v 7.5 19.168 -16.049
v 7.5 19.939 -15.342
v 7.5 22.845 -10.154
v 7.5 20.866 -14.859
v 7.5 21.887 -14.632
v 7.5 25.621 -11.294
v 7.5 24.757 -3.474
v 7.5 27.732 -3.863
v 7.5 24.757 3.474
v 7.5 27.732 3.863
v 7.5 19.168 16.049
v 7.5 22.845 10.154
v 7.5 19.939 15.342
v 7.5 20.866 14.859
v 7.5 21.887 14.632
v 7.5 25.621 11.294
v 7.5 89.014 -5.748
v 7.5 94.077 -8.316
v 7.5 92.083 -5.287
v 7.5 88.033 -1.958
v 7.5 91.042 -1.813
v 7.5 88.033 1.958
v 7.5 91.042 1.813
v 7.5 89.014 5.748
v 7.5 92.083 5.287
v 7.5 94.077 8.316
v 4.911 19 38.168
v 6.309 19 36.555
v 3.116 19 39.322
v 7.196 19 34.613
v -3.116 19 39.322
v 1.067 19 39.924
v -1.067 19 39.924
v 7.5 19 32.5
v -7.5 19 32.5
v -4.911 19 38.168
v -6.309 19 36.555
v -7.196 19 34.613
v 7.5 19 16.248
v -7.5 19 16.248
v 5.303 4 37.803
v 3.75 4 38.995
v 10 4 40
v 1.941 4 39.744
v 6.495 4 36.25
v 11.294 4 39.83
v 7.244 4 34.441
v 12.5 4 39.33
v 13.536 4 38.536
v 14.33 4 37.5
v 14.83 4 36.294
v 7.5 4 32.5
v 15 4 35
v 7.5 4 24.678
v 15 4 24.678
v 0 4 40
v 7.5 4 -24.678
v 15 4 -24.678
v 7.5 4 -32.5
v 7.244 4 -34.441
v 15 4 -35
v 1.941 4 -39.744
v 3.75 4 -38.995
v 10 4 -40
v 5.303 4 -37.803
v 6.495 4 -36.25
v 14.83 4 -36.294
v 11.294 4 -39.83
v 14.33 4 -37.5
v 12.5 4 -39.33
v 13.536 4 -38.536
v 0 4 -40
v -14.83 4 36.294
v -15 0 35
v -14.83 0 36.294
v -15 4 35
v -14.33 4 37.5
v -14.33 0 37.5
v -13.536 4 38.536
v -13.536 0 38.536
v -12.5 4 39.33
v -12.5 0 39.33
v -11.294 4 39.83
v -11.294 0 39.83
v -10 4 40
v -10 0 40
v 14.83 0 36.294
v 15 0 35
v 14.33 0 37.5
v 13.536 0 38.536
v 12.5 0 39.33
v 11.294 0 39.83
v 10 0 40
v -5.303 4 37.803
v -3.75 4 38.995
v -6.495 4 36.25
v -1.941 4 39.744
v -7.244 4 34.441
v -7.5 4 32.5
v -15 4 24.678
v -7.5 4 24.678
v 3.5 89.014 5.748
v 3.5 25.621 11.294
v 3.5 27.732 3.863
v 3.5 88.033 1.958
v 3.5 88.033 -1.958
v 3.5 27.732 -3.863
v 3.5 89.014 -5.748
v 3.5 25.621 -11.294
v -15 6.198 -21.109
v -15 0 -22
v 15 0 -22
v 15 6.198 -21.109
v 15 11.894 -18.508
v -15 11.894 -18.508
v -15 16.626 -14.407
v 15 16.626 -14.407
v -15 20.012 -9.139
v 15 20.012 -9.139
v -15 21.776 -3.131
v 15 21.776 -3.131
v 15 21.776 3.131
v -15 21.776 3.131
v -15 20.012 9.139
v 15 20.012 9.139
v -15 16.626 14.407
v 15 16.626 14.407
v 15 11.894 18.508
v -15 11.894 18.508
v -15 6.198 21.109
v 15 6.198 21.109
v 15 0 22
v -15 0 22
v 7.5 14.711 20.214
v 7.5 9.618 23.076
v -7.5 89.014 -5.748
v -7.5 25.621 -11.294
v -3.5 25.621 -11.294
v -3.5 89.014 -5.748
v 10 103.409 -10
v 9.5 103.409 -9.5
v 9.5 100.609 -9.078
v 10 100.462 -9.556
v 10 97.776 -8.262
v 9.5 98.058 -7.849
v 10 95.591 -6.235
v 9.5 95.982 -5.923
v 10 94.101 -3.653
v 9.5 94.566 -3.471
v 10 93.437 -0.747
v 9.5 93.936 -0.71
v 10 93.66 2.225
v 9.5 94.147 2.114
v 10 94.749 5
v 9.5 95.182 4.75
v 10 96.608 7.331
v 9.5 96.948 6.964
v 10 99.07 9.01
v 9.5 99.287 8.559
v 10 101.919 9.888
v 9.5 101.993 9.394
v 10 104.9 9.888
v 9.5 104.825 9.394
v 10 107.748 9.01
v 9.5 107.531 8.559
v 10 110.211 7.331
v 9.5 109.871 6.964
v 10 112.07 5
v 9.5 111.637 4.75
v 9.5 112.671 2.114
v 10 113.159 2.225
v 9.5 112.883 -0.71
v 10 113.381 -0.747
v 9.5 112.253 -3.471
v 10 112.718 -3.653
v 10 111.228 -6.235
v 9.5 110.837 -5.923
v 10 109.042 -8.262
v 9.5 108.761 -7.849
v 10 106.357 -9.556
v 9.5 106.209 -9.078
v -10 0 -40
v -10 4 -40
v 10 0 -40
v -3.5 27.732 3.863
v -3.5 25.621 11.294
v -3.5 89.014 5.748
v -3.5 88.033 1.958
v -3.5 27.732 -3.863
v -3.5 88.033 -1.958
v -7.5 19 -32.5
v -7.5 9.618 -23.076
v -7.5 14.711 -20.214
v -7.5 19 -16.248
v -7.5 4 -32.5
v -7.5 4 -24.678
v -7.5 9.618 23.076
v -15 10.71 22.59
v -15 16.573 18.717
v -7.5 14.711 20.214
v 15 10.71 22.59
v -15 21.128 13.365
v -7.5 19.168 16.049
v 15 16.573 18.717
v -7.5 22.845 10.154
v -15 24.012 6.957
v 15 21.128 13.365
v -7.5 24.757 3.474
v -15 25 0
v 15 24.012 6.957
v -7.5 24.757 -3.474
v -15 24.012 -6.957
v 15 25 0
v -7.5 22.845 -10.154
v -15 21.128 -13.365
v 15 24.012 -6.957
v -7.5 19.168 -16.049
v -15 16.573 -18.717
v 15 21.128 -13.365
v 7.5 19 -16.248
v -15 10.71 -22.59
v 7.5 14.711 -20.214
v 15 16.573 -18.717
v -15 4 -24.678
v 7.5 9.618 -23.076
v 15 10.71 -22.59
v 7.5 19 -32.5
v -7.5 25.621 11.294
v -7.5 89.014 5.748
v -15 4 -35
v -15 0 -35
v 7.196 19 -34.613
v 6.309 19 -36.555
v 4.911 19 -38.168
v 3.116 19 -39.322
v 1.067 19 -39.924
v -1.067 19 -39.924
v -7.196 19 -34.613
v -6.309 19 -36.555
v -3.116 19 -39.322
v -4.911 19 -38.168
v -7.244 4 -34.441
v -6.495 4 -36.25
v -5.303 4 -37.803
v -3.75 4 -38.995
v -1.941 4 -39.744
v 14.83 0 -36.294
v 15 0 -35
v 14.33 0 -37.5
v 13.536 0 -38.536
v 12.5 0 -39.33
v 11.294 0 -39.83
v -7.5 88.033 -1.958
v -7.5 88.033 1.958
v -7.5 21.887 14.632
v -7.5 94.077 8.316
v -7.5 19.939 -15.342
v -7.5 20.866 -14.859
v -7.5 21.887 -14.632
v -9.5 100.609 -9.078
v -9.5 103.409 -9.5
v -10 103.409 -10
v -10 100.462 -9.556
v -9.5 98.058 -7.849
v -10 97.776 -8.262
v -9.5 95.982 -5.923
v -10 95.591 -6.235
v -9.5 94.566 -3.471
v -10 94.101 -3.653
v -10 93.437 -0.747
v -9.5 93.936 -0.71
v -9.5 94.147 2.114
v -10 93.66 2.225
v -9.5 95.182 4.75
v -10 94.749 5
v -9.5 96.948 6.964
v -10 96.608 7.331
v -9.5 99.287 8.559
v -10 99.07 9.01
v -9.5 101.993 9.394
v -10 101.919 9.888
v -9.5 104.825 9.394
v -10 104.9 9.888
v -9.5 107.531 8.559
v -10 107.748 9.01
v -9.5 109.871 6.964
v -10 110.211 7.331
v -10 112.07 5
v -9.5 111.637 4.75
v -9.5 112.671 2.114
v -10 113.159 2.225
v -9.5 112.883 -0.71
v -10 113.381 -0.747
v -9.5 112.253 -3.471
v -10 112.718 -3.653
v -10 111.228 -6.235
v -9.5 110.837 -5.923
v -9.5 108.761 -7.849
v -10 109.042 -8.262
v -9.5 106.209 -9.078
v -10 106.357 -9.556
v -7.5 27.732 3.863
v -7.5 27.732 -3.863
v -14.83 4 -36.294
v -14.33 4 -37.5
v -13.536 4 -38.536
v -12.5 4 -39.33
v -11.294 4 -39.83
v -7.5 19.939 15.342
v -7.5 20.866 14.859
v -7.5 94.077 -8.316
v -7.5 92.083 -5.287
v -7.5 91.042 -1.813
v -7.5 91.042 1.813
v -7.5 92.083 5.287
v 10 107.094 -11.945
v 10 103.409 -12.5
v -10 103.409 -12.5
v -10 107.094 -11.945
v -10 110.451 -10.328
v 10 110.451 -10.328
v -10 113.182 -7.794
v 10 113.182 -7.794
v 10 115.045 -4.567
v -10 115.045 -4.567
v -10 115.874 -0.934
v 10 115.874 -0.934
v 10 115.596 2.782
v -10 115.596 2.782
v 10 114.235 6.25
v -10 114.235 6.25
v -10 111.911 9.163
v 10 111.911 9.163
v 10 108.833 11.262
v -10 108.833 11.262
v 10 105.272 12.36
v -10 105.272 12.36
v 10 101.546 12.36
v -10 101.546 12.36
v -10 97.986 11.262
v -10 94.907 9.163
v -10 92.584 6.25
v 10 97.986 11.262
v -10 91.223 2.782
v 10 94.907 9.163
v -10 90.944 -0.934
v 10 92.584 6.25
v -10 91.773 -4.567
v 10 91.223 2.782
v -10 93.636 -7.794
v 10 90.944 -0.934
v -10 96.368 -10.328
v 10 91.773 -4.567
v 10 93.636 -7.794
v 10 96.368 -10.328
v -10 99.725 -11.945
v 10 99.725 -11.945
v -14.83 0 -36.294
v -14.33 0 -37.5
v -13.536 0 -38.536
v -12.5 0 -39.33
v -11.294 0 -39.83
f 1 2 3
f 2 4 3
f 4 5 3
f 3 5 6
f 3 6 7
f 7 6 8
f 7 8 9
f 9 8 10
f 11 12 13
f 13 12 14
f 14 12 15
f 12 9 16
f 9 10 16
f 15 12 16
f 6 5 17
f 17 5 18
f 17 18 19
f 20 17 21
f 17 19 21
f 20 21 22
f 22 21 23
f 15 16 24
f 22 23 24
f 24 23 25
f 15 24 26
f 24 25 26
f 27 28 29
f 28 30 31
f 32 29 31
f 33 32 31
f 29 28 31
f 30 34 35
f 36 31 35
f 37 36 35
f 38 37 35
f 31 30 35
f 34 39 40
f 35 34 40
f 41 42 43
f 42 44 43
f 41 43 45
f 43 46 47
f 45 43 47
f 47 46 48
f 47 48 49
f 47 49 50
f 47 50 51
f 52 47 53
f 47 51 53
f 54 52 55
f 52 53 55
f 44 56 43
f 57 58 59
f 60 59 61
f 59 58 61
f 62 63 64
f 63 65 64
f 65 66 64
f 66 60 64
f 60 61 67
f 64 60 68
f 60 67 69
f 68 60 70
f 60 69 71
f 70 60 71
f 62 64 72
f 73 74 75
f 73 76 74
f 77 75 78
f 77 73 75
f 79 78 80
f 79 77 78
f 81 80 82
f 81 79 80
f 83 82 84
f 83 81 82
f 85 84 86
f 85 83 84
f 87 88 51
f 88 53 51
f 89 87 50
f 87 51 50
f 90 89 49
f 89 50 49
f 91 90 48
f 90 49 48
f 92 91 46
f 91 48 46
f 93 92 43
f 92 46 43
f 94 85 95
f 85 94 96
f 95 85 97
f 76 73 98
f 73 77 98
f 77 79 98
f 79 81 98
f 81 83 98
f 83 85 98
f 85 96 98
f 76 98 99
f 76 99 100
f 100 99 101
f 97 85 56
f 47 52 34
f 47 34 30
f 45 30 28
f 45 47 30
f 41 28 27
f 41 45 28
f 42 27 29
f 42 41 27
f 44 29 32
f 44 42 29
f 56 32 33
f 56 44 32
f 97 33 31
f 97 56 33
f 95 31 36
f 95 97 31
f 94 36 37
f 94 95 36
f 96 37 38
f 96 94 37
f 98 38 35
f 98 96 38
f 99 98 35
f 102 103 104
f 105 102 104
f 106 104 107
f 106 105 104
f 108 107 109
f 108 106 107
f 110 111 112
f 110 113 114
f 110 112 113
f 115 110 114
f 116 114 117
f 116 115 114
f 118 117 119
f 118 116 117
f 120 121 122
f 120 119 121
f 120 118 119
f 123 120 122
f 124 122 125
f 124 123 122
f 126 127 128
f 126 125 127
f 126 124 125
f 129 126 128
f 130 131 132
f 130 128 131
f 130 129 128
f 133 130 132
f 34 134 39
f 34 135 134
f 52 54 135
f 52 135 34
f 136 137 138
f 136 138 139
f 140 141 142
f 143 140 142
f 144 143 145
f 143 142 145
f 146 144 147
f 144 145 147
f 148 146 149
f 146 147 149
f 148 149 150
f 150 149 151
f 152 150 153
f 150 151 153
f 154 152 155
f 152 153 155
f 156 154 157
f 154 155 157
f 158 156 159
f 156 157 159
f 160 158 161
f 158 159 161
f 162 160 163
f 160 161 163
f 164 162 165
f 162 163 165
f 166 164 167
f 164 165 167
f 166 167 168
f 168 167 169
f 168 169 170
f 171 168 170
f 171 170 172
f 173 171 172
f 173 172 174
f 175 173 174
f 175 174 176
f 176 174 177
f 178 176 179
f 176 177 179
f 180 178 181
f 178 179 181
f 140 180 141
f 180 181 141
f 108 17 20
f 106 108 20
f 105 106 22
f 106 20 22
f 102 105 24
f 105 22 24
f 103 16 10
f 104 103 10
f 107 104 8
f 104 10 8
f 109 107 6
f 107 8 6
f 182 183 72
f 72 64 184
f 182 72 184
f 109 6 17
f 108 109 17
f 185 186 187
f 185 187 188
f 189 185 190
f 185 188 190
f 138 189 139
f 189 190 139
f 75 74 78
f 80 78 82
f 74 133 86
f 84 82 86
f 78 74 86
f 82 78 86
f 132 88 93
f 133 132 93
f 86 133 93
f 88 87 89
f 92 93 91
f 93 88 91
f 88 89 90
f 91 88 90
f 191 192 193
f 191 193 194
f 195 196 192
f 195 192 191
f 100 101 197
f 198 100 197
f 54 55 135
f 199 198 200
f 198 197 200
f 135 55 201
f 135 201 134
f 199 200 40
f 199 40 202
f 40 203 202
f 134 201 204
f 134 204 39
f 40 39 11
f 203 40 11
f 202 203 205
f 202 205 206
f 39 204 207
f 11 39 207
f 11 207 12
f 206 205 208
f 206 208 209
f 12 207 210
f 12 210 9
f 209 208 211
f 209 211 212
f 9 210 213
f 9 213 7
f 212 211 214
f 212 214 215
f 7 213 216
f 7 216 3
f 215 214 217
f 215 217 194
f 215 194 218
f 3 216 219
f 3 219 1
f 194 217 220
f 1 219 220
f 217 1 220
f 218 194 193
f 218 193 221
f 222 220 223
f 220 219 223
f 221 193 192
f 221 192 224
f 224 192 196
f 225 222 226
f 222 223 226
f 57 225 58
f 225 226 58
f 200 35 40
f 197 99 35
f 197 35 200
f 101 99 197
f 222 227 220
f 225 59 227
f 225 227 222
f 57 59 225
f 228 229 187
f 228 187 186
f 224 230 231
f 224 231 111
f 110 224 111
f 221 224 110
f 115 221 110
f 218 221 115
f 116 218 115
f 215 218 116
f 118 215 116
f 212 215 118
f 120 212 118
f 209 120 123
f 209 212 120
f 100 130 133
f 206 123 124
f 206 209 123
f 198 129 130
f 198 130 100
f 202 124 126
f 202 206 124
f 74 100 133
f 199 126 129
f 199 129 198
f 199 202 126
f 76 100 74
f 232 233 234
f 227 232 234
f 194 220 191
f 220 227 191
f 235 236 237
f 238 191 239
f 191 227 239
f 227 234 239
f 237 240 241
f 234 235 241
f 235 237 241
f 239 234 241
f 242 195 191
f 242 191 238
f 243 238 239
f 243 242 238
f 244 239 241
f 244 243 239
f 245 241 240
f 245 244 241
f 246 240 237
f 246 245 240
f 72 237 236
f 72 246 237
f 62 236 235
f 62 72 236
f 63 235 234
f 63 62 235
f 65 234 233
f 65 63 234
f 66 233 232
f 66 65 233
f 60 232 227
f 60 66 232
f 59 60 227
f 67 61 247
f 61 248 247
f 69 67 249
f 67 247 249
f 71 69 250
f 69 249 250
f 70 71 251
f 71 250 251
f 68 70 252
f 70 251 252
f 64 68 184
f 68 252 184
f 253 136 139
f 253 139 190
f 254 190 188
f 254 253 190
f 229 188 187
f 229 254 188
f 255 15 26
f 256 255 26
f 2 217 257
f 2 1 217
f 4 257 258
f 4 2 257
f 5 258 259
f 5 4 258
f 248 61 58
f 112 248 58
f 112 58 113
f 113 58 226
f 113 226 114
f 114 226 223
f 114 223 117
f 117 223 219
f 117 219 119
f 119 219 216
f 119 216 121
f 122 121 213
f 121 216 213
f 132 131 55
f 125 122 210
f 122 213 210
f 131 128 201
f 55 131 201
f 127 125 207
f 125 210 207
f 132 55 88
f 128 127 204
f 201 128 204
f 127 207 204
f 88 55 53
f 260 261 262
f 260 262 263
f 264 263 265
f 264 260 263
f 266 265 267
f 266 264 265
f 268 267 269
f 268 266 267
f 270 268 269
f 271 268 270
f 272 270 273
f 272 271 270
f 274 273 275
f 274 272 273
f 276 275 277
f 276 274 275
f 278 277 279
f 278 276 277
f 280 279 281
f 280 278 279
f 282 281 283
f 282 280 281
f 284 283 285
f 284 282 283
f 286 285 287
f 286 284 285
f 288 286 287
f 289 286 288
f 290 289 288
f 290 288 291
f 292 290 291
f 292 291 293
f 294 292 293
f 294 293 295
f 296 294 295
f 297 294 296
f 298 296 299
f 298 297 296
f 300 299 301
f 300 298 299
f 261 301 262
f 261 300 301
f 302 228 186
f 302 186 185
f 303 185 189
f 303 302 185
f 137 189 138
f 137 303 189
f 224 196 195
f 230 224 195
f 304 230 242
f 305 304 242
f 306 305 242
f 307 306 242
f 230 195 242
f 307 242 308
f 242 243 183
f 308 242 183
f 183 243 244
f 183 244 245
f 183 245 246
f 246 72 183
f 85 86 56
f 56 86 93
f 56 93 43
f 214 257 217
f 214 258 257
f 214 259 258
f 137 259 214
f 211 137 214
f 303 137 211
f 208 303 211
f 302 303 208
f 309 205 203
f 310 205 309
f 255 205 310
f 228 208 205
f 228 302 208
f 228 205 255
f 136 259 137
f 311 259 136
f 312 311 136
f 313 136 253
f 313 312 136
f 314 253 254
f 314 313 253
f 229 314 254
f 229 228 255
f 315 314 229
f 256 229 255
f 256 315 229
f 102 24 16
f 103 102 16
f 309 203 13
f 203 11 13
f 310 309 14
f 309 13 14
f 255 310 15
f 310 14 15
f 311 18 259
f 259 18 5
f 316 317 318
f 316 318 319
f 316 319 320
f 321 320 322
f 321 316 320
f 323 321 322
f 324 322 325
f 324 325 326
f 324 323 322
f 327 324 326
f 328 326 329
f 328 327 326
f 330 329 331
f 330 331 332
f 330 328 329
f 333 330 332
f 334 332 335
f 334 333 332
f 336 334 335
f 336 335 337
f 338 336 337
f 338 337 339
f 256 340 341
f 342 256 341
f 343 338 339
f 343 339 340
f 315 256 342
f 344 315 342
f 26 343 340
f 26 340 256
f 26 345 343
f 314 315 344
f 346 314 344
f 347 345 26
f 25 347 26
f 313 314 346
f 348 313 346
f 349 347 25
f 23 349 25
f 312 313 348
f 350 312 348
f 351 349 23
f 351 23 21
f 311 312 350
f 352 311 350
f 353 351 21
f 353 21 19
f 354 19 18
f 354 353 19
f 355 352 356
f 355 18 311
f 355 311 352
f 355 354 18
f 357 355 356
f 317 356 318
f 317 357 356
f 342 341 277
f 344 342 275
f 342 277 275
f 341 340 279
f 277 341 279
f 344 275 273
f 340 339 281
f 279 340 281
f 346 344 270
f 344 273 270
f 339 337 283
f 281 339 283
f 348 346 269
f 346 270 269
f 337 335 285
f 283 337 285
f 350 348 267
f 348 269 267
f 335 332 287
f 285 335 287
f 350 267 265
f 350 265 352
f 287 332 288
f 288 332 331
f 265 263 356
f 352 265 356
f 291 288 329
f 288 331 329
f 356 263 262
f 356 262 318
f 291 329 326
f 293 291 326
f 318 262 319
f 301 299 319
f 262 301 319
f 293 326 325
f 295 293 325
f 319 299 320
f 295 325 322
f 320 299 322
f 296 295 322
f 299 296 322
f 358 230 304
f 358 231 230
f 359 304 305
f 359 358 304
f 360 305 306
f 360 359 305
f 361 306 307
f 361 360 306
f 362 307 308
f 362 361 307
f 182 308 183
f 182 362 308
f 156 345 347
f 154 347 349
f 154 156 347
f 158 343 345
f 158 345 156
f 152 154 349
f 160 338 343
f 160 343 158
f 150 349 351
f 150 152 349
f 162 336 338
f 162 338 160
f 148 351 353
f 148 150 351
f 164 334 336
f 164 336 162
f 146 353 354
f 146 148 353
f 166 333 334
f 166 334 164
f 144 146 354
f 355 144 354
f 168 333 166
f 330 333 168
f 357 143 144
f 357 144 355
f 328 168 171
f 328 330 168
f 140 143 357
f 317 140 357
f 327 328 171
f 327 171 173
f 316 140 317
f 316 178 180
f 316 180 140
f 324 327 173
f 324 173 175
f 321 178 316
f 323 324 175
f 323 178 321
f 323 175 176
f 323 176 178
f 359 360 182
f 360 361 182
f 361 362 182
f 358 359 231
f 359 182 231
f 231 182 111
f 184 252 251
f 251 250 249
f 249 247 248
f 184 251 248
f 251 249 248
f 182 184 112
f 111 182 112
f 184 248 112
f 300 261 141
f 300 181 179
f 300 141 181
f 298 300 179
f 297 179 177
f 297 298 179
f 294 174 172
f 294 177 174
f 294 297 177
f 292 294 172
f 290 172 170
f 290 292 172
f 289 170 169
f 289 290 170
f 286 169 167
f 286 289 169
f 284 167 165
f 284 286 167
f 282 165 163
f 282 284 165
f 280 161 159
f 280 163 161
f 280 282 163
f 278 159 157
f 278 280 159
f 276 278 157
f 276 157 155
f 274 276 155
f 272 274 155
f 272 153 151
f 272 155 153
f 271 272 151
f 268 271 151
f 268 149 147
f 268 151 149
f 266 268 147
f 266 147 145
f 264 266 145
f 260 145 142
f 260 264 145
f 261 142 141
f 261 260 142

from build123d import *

# Parameters (mm, degrees)
BOSS_EXTRUDE1_DEPTH     = 15
BOSS_EXTRUDE2_DEPTH     = 7.5
SKETCH5_R               = 12.5
BOSS_EXTRUDE3_DEPTH     = 10
BOSS_EXTRUDE4_DEPTH     = 15
CUT_EXTRUDE2_DEPTH      = 126.139759491
CUT_EXTRUDE2_DEPTH_BACK = 126.139759491
SKETCH7_R               = 22
SKETCH7_R_2             = 9.5
CUT_EXTRUDE3_DEPTH      = 4
CHAMFER1_SIZE           = 0.5
FILLET1_R               = 5
FILLET2_R               = 4


with BuildPart() as part:
    # Sketch3 → Boss-Extrude1 (new, symmetric)
    with BuildSketch(Plane(origin=(0, 0, 0), x_dir=(0, 0, -1), z_dir=(1, 0, 0))):
        with BuildLine():
            Line((40, 0), (-40, 0))
            Line((-40, 0), (-40, 4))
            Line((-40, 4), (-24.677925359, 4))
            ThreePointArc((-24.677925359, 4), (0, 25), (24.677925359, 4))
            Line((24.677925359, 4), (40, 4))
            Line((40, 4), (40, 0))
        make_face()
    extrude(amount=BOSS_EXTRUDE1_DEPTH, both=True)

    # Sketch4 → Boss-Extrude2 (add, symmetric)
    with BuildSketch(Plane(origin=(0, 0, 0), x_dir=(0, 0, -1), z_dir=(1, 0, 0))):
        Polygon((7.5, 103.409272302), (16.54713903, 0), (-16.54713903, 0), (-7.5, 103.409272302), align=None)
    extrude(amount=BOSS_EXTRUDE2_DEPTH, both=True)

    # Sketch5 → Boss-Extrude3 (add, symmetric)
    with BuildSketch(Plane(origin=(0, 0, 0), x_dir=(0, 0, -1), z_dir=(1, 0, 0))):
        with Locations((0, 103.409272302)):
            Circle(SKETCH5_R)
    extrude(amount=BOSS_EXTRUDE3_DEPTH, both=True)

    # Sketch6 → Boss-Extrude4 (add)
    with BuildSketch(Plane(origin=(0, 4, 0), x_dir=(1, 0, 0), z_dir=(0, 1, 0))):
        with BuildLine():
            Line((-7.5, -32.5), (-7.5, 32.5))
            ThreePointArc((-7.5, 32.5), (0, 40), (7.5, 32.5))
            Line((7.5, 32.5), (7.5, -32.5))
            ThreePointArc((7.5, -32.5), (0, -40), (-7.5, -32.5))
        make_face()
    extrude(amount=BOSS_EXTRUDE4_DEPTH)

    # Sketch7 → Cut-Extrude2 (cut, two sides: drawn at the far end of the back side and taken through both)
    with BuildSketch(Plane(origin=(10, 0, 0), x_dir=(0, 0, -1), z_dir=(1, 0, 0)).offset(-CUT_EXTRUDE2_DEPTH_BACK)):
        Circle(SKETCH7_R)
        with Locations((0, 103.409272302)):
            Circle(SKETCH7_R_2)
    extrude(amount=CUT_EXTRUDE2_DEPTH + CUT_EXTRUDE2_DEPTH_BACK, mode=Mode.SUBTRACT)

    # Sketch13 → Cut-Extrude3 (cut)
    with BuildSketch(Plane(origin=(7.5, 0, 0), x_dir=(0, 0, -1), z_dir=(1, 0, 0))):
        with BuildLine():
            Line((-5.747925596, 89.014434639), (-11.294120161, 25.621140681))
            ThreePointArc((-11.294120161, 25.621140681), (0, 28), (11.294120161, 25.621140681))
            Line((11.294120161, 25.621140681), (5.747925596, 89.014434639))
            ThreePointArc((5.747925596, 89.014434639), (0, 87.909272302), (-5.747925596, 89.014434639))
        make_face()
    cut_extrude3 = extrude(amount=-CUT_EXTRUDE3_DEPTH, mode=Mode.SUBTRACT)

    # Mirror1: Cut-Extrude3 across plane
    add(cut_extrude3.mirror(Plane(origin=(0, 0, 0), x_dir=(0, 0, 1), z_dir=(1, 0, 0))), mode=Mode.SUBTRACT)

    # Chamfer1
    chamfer1_edges = [part.edges().sort_by_distance(p)[0] for p in [
        (10, 103.409272302, 9.5),
        (-10, 103.409272302, 9.5),
    ]]
    chamfer(chamfer1_edges, length=CHAMFER1_SIZE)

    # Fillet1
    fillet1_edges = [part.edges().sort_by_distance(p)[0] for p in [
        (15, 2, 40),
        (15, 2, -40),
        (-15, 2, -40),
        (-15, 2, 40),
    ]]
    fillet(fillet1_edges, radius=FILLET1_R)

    # Fillet2
    fillet2_edges = [part.edges().sort_by_distance(p)[0] for p in [
        (0, 20.16070078, 14.783306263),
        (0, 20.16070078, -14.783306263),
    ]]
    fillet(fillet2_edges, radius=FILLET2_R)


solid = part.part
